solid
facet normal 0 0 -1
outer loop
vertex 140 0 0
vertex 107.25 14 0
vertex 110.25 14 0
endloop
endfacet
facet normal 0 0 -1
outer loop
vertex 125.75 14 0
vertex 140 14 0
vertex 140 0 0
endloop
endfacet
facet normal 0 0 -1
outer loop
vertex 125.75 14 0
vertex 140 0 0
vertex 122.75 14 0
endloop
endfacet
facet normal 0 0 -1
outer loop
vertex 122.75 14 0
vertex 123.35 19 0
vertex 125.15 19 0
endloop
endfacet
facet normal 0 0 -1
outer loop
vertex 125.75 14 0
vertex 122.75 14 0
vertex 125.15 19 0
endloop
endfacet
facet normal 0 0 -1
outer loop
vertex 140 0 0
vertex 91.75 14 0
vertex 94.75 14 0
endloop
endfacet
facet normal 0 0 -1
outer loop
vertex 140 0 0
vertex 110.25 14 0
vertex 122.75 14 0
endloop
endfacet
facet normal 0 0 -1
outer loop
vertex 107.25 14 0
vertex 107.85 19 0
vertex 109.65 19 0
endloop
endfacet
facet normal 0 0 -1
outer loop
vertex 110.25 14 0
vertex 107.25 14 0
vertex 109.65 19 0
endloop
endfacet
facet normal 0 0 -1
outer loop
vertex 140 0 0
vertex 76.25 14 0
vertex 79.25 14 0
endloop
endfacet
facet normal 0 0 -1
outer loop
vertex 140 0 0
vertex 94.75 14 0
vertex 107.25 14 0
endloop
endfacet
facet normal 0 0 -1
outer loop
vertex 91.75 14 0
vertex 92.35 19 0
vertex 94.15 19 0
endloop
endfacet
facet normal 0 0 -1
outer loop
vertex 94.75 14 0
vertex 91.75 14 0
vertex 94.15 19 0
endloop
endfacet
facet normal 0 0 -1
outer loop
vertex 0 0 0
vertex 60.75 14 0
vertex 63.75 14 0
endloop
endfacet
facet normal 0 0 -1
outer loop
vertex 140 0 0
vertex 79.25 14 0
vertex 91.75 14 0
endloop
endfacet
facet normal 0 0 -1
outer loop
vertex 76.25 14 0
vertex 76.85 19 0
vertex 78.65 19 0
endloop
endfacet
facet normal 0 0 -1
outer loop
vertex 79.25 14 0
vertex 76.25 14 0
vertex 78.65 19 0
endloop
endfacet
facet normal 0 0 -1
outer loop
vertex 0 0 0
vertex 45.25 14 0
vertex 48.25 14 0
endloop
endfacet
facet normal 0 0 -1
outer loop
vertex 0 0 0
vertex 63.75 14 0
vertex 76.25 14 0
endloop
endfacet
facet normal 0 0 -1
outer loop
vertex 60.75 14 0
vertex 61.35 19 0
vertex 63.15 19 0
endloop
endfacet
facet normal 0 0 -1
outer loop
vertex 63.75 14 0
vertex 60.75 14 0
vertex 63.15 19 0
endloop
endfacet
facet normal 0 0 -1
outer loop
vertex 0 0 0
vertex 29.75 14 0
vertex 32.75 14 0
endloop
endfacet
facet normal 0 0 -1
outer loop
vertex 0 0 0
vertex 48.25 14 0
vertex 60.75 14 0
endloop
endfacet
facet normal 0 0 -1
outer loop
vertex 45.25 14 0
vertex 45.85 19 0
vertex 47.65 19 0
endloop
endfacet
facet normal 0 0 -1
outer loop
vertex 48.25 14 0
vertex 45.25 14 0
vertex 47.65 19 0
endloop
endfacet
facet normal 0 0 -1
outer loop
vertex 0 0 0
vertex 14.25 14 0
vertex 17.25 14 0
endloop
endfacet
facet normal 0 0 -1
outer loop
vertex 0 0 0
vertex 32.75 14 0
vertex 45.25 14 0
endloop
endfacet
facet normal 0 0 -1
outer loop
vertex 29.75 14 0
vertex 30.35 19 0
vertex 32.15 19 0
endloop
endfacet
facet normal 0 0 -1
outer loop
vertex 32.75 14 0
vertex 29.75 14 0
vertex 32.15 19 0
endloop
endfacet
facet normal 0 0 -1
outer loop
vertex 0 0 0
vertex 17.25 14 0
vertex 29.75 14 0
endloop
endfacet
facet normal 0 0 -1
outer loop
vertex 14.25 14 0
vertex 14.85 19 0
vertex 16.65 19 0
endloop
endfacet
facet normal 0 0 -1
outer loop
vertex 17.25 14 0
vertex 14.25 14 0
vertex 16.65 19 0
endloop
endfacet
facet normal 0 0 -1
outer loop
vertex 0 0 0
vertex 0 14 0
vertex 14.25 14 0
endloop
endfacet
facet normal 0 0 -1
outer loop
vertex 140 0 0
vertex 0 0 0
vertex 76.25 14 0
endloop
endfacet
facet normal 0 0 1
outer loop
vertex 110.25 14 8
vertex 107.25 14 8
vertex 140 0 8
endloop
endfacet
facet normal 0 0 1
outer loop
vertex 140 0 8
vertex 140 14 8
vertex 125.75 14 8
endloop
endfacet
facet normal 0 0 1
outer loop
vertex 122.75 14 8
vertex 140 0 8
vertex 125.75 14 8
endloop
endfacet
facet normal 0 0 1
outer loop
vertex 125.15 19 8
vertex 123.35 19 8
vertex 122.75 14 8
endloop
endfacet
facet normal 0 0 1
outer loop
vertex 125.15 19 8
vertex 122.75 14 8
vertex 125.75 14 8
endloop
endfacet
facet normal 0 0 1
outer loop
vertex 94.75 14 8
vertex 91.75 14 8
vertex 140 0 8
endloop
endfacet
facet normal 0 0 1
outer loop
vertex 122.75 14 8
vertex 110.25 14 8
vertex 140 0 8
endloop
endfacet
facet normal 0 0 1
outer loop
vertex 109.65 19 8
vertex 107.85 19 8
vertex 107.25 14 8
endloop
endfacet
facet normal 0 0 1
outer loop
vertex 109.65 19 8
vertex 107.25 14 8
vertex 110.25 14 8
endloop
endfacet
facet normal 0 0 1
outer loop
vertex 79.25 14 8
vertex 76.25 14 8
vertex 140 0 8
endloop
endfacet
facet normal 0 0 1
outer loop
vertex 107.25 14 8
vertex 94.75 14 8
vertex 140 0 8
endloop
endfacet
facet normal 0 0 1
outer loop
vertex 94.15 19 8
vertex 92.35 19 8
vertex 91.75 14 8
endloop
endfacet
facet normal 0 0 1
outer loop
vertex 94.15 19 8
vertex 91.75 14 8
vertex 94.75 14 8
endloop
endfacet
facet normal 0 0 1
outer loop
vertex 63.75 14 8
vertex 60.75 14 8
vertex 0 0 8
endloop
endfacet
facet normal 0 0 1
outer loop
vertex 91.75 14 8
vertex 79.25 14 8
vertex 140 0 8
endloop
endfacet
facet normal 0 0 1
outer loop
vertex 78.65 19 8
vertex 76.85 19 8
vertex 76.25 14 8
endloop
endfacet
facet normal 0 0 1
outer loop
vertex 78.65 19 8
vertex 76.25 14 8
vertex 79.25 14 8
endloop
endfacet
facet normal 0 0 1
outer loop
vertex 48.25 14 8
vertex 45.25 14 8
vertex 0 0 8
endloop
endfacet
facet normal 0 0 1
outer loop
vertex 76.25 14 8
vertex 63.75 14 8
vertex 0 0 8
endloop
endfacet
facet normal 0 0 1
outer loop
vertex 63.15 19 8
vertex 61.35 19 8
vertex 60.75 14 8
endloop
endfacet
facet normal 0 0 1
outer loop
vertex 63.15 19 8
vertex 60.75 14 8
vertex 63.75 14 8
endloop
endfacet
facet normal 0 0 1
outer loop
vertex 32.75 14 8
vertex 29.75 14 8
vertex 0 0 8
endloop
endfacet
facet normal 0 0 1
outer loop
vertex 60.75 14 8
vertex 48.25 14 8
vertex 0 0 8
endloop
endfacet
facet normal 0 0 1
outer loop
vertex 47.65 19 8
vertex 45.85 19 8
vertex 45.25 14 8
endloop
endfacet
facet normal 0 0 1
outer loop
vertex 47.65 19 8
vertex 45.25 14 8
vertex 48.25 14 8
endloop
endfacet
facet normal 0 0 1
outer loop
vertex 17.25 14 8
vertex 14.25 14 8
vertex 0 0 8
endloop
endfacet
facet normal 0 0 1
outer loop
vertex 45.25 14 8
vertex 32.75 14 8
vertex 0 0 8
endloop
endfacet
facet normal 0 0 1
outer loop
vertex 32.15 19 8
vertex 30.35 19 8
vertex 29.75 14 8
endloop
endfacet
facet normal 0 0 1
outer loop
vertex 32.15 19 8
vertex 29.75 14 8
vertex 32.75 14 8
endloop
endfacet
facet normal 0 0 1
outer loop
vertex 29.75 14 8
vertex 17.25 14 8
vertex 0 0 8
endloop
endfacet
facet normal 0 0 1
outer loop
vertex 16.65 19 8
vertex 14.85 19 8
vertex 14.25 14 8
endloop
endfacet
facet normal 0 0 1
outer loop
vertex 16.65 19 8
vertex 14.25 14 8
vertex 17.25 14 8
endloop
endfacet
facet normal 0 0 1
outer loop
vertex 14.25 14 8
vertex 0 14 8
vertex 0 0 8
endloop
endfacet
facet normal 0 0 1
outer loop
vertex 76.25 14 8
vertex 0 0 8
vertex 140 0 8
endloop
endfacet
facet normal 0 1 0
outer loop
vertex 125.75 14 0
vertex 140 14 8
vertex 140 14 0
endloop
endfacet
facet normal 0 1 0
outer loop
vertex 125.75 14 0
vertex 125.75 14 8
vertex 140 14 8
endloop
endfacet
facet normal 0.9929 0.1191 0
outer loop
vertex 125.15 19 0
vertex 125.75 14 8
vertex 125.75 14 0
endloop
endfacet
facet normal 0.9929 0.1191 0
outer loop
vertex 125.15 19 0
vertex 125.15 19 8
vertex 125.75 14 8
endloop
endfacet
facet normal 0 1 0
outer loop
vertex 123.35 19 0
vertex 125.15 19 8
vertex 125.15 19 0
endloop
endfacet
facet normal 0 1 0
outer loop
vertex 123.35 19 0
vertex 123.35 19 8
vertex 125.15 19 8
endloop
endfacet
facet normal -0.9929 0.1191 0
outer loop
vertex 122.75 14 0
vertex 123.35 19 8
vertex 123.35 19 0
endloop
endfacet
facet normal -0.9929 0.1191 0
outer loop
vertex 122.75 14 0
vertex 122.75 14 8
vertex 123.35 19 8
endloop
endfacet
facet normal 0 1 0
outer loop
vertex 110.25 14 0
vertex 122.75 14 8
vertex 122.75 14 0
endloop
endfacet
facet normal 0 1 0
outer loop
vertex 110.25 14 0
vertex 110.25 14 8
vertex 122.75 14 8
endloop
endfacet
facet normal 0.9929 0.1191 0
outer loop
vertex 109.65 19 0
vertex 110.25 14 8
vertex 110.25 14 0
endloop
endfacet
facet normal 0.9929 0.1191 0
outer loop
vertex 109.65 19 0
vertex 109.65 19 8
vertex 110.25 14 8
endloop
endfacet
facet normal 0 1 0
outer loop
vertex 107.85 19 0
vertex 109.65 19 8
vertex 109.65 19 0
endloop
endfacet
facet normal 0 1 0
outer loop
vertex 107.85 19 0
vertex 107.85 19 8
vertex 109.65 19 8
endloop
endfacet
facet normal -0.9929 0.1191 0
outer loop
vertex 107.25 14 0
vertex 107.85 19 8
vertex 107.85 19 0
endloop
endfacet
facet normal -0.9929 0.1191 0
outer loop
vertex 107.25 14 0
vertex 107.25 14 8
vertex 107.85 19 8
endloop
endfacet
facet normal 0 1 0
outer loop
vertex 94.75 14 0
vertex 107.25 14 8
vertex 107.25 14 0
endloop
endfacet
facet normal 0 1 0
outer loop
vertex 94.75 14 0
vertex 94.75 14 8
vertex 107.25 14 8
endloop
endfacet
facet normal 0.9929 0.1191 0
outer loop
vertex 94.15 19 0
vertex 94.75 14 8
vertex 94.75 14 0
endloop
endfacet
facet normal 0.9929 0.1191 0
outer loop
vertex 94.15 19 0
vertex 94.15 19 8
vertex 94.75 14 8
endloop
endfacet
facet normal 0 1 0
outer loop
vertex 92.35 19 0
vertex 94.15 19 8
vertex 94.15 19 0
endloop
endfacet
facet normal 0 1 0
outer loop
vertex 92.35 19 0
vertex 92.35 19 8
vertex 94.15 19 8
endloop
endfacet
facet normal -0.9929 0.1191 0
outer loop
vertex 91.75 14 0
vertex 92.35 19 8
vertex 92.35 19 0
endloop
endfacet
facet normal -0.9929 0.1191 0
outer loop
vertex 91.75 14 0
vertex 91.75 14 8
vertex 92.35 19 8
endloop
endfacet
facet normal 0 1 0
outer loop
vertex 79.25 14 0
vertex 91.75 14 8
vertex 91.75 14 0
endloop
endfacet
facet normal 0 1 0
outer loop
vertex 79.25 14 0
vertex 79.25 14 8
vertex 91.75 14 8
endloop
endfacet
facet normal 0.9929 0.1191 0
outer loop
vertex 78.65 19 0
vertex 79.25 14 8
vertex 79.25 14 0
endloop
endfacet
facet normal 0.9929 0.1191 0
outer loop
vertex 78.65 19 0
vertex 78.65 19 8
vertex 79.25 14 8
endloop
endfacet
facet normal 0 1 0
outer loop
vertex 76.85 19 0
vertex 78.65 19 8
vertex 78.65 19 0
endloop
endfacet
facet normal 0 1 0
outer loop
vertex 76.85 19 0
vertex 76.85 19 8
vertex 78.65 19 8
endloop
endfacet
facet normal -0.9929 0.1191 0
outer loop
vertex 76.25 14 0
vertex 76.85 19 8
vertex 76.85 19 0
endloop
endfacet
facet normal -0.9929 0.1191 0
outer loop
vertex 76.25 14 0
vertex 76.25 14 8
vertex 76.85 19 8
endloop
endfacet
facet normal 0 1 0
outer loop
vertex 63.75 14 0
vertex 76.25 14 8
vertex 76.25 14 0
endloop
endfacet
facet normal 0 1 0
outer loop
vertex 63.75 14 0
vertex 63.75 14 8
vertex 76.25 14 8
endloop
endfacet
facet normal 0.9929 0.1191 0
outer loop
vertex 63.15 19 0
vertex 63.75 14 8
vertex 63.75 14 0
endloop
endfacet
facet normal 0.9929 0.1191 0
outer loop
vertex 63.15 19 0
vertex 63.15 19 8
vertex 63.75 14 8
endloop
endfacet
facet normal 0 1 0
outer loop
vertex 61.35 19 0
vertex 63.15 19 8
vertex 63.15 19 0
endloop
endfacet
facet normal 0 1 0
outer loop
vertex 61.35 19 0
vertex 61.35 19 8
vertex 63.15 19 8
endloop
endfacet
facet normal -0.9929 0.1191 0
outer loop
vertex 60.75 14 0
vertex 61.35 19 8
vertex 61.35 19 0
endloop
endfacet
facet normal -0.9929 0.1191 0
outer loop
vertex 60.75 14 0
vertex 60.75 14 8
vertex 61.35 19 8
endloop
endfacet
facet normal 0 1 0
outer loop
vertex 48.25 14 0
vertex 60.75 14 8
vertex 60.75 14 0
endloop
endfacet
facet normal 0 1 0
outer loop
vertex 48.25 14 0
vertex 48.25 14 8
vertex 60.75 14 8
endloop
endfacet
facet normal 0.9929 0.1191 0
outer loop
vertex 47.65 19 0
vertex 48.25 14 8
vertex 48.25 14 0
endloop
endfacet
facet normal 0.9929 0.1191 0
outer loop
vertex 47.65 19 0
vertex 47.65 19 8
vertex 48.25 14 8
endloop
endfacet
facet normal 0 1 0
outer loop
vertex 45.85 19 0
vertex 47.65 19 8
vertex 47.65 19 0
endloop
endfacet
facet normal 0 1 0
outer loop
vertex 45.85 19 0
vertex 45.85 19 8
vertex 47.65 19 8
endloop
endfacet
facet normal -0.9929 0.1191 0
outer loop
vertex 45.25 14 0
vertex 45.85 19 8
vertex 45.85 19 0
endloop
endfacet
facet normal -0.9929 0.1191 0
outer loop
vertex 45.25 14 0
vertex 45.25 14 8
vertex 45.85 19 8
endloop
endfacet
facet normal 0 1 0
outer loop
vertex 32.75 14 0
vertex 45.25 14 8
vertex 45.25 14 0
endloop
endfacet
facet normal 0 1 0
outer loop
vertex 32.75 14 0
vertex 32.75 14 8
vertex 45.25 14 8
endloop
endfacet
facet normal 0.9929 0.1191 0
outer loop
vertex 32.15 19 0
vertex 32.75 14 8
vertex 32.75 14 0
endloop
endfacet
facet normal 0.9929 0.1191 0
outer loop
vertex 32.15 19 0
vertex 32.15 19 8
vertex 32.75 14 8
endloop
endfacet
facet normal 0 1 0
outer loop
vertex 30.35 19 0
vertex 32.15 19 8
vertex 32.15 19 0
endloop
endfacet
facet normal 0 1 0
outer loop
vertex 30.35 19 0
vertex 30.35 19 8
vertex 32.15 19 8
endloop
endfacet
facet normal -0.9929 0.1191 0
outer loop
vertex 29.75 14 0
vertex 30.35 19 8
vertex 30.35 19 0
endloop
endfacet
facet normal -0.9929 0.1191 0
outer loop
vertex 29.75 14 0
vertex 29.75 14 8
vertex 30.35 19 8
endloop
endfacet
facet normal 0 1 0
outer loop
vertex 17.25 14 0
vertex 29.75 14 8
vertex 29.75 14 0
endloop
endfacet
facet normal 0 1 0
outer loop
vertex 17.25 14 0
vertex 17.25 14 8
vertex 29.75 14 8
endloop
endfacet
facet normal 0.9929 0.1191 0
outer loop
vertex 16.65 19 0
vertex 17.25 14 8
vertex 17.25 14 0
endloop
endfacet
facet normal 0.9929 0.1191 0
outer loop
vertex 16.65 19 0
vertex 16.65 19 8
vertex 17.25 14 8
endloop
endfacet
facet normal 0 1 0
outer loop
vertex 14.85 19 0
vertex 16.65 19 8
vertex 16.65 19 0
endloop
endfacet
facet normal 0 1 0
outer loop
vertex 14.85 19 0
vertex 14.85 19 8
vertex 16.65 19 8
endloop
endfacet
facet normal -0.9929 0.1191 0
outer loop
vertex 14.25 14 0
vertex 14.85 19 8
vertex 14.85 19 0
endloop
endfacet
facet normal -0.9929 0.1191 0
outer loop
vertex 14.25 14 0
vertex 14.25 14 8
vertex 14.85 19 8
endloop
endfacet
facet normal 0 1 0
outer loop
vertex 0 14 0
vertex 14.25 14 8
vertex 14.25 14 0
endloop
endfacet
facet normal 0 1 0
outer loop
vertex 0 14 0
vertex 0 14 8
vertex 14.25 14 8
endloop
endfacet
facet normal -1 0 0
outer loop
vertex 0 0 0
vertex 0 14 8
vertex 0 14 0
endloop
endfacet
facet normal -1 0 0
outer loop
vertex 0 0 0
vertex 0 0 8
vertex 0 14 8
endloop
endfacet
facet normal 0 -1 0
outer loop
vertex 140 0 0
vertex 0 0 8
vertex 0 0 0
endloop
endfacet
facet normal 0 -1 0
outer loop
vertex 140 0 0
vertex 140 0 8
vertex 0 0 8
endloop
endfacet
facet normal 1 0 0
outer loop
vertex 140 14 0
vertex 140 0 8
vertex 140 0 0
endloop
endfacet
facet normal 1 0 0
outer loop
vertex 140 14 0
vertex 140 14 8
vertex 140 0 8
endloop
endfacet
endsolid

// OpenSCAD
$fn = 32;

// ----------------------------------------------------------------------
// Gear rack: 8 teeth on a 140 mm bar, pitch 15.5 mm
// ----------------------------------------------------------------------

// --- parameters (mm) ---
profile_height = 8;       // extrusion height
profile_points = 36;      // points of the closed outline

profile = [[0, 0], [140, 0], [140, 14], [125.75, 14], [125.15, 19], [123.35, 19], [122.75, 14], [110.25, 14], [109.65, 19], [107.85, 19], [107.25, 14], [94.75, 14], [94.15, 19], [92.35, 19], [91.75, 14], [79.25, 14], [78.65, 19], [76.85, 19], [76.25, 14], [63.75, 14], [63.15, 19], [61.35, 19], [60.75, 14], [48.25, 14], [47.65, 19], [45.85, 19], [45.25, 14], [32.75, 14], [32.15, 19], [30.35, 19], [29.75, 14], [17.25, 14], [16.65, 19], [14.85, 19], [14.25, 14], [0, 14]];  // single closed polygon, 36 points, counter clockwise

// --- the one profile operation ---
linear_extrude(height = profile_height) polygon(points = profile);
